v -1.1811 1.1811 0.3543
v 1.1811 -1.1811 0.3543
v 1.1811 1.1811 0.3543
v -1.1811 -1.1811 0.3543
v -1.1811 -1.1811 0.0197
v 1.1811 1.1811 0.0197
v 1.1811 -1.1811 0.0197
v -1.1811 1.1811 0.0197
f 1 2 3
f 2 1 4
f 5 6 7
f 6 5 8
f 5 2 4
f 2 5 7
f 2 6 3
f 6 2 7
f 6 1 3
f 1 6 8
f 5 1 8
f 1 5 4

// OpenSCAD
// file: defines.scad
scale = 1/2.54;

N = 44;
ND = 12;
NE = 10;
e = 0.50;
A = 0.90;   // 0.80..1.00
A1 = 0.05;  // 0.025..0.075
E = 6.00;
E2 = 4.55;  // 4.40..4.70
D = 6.00;
D2 = 4.55;  // 4.40..4.70
b = 0.25;   // 0.20..0.30
L = 0.25;   // 0.20..0.30
K = 0.20;   //
// main file
include <defines.scad>

scale(scale)
  color([0.15,0.15,0.15])
    translate([0, 0, (A - A1) / 2 + A1])
      cube([D, E, A - A1], center = true);
